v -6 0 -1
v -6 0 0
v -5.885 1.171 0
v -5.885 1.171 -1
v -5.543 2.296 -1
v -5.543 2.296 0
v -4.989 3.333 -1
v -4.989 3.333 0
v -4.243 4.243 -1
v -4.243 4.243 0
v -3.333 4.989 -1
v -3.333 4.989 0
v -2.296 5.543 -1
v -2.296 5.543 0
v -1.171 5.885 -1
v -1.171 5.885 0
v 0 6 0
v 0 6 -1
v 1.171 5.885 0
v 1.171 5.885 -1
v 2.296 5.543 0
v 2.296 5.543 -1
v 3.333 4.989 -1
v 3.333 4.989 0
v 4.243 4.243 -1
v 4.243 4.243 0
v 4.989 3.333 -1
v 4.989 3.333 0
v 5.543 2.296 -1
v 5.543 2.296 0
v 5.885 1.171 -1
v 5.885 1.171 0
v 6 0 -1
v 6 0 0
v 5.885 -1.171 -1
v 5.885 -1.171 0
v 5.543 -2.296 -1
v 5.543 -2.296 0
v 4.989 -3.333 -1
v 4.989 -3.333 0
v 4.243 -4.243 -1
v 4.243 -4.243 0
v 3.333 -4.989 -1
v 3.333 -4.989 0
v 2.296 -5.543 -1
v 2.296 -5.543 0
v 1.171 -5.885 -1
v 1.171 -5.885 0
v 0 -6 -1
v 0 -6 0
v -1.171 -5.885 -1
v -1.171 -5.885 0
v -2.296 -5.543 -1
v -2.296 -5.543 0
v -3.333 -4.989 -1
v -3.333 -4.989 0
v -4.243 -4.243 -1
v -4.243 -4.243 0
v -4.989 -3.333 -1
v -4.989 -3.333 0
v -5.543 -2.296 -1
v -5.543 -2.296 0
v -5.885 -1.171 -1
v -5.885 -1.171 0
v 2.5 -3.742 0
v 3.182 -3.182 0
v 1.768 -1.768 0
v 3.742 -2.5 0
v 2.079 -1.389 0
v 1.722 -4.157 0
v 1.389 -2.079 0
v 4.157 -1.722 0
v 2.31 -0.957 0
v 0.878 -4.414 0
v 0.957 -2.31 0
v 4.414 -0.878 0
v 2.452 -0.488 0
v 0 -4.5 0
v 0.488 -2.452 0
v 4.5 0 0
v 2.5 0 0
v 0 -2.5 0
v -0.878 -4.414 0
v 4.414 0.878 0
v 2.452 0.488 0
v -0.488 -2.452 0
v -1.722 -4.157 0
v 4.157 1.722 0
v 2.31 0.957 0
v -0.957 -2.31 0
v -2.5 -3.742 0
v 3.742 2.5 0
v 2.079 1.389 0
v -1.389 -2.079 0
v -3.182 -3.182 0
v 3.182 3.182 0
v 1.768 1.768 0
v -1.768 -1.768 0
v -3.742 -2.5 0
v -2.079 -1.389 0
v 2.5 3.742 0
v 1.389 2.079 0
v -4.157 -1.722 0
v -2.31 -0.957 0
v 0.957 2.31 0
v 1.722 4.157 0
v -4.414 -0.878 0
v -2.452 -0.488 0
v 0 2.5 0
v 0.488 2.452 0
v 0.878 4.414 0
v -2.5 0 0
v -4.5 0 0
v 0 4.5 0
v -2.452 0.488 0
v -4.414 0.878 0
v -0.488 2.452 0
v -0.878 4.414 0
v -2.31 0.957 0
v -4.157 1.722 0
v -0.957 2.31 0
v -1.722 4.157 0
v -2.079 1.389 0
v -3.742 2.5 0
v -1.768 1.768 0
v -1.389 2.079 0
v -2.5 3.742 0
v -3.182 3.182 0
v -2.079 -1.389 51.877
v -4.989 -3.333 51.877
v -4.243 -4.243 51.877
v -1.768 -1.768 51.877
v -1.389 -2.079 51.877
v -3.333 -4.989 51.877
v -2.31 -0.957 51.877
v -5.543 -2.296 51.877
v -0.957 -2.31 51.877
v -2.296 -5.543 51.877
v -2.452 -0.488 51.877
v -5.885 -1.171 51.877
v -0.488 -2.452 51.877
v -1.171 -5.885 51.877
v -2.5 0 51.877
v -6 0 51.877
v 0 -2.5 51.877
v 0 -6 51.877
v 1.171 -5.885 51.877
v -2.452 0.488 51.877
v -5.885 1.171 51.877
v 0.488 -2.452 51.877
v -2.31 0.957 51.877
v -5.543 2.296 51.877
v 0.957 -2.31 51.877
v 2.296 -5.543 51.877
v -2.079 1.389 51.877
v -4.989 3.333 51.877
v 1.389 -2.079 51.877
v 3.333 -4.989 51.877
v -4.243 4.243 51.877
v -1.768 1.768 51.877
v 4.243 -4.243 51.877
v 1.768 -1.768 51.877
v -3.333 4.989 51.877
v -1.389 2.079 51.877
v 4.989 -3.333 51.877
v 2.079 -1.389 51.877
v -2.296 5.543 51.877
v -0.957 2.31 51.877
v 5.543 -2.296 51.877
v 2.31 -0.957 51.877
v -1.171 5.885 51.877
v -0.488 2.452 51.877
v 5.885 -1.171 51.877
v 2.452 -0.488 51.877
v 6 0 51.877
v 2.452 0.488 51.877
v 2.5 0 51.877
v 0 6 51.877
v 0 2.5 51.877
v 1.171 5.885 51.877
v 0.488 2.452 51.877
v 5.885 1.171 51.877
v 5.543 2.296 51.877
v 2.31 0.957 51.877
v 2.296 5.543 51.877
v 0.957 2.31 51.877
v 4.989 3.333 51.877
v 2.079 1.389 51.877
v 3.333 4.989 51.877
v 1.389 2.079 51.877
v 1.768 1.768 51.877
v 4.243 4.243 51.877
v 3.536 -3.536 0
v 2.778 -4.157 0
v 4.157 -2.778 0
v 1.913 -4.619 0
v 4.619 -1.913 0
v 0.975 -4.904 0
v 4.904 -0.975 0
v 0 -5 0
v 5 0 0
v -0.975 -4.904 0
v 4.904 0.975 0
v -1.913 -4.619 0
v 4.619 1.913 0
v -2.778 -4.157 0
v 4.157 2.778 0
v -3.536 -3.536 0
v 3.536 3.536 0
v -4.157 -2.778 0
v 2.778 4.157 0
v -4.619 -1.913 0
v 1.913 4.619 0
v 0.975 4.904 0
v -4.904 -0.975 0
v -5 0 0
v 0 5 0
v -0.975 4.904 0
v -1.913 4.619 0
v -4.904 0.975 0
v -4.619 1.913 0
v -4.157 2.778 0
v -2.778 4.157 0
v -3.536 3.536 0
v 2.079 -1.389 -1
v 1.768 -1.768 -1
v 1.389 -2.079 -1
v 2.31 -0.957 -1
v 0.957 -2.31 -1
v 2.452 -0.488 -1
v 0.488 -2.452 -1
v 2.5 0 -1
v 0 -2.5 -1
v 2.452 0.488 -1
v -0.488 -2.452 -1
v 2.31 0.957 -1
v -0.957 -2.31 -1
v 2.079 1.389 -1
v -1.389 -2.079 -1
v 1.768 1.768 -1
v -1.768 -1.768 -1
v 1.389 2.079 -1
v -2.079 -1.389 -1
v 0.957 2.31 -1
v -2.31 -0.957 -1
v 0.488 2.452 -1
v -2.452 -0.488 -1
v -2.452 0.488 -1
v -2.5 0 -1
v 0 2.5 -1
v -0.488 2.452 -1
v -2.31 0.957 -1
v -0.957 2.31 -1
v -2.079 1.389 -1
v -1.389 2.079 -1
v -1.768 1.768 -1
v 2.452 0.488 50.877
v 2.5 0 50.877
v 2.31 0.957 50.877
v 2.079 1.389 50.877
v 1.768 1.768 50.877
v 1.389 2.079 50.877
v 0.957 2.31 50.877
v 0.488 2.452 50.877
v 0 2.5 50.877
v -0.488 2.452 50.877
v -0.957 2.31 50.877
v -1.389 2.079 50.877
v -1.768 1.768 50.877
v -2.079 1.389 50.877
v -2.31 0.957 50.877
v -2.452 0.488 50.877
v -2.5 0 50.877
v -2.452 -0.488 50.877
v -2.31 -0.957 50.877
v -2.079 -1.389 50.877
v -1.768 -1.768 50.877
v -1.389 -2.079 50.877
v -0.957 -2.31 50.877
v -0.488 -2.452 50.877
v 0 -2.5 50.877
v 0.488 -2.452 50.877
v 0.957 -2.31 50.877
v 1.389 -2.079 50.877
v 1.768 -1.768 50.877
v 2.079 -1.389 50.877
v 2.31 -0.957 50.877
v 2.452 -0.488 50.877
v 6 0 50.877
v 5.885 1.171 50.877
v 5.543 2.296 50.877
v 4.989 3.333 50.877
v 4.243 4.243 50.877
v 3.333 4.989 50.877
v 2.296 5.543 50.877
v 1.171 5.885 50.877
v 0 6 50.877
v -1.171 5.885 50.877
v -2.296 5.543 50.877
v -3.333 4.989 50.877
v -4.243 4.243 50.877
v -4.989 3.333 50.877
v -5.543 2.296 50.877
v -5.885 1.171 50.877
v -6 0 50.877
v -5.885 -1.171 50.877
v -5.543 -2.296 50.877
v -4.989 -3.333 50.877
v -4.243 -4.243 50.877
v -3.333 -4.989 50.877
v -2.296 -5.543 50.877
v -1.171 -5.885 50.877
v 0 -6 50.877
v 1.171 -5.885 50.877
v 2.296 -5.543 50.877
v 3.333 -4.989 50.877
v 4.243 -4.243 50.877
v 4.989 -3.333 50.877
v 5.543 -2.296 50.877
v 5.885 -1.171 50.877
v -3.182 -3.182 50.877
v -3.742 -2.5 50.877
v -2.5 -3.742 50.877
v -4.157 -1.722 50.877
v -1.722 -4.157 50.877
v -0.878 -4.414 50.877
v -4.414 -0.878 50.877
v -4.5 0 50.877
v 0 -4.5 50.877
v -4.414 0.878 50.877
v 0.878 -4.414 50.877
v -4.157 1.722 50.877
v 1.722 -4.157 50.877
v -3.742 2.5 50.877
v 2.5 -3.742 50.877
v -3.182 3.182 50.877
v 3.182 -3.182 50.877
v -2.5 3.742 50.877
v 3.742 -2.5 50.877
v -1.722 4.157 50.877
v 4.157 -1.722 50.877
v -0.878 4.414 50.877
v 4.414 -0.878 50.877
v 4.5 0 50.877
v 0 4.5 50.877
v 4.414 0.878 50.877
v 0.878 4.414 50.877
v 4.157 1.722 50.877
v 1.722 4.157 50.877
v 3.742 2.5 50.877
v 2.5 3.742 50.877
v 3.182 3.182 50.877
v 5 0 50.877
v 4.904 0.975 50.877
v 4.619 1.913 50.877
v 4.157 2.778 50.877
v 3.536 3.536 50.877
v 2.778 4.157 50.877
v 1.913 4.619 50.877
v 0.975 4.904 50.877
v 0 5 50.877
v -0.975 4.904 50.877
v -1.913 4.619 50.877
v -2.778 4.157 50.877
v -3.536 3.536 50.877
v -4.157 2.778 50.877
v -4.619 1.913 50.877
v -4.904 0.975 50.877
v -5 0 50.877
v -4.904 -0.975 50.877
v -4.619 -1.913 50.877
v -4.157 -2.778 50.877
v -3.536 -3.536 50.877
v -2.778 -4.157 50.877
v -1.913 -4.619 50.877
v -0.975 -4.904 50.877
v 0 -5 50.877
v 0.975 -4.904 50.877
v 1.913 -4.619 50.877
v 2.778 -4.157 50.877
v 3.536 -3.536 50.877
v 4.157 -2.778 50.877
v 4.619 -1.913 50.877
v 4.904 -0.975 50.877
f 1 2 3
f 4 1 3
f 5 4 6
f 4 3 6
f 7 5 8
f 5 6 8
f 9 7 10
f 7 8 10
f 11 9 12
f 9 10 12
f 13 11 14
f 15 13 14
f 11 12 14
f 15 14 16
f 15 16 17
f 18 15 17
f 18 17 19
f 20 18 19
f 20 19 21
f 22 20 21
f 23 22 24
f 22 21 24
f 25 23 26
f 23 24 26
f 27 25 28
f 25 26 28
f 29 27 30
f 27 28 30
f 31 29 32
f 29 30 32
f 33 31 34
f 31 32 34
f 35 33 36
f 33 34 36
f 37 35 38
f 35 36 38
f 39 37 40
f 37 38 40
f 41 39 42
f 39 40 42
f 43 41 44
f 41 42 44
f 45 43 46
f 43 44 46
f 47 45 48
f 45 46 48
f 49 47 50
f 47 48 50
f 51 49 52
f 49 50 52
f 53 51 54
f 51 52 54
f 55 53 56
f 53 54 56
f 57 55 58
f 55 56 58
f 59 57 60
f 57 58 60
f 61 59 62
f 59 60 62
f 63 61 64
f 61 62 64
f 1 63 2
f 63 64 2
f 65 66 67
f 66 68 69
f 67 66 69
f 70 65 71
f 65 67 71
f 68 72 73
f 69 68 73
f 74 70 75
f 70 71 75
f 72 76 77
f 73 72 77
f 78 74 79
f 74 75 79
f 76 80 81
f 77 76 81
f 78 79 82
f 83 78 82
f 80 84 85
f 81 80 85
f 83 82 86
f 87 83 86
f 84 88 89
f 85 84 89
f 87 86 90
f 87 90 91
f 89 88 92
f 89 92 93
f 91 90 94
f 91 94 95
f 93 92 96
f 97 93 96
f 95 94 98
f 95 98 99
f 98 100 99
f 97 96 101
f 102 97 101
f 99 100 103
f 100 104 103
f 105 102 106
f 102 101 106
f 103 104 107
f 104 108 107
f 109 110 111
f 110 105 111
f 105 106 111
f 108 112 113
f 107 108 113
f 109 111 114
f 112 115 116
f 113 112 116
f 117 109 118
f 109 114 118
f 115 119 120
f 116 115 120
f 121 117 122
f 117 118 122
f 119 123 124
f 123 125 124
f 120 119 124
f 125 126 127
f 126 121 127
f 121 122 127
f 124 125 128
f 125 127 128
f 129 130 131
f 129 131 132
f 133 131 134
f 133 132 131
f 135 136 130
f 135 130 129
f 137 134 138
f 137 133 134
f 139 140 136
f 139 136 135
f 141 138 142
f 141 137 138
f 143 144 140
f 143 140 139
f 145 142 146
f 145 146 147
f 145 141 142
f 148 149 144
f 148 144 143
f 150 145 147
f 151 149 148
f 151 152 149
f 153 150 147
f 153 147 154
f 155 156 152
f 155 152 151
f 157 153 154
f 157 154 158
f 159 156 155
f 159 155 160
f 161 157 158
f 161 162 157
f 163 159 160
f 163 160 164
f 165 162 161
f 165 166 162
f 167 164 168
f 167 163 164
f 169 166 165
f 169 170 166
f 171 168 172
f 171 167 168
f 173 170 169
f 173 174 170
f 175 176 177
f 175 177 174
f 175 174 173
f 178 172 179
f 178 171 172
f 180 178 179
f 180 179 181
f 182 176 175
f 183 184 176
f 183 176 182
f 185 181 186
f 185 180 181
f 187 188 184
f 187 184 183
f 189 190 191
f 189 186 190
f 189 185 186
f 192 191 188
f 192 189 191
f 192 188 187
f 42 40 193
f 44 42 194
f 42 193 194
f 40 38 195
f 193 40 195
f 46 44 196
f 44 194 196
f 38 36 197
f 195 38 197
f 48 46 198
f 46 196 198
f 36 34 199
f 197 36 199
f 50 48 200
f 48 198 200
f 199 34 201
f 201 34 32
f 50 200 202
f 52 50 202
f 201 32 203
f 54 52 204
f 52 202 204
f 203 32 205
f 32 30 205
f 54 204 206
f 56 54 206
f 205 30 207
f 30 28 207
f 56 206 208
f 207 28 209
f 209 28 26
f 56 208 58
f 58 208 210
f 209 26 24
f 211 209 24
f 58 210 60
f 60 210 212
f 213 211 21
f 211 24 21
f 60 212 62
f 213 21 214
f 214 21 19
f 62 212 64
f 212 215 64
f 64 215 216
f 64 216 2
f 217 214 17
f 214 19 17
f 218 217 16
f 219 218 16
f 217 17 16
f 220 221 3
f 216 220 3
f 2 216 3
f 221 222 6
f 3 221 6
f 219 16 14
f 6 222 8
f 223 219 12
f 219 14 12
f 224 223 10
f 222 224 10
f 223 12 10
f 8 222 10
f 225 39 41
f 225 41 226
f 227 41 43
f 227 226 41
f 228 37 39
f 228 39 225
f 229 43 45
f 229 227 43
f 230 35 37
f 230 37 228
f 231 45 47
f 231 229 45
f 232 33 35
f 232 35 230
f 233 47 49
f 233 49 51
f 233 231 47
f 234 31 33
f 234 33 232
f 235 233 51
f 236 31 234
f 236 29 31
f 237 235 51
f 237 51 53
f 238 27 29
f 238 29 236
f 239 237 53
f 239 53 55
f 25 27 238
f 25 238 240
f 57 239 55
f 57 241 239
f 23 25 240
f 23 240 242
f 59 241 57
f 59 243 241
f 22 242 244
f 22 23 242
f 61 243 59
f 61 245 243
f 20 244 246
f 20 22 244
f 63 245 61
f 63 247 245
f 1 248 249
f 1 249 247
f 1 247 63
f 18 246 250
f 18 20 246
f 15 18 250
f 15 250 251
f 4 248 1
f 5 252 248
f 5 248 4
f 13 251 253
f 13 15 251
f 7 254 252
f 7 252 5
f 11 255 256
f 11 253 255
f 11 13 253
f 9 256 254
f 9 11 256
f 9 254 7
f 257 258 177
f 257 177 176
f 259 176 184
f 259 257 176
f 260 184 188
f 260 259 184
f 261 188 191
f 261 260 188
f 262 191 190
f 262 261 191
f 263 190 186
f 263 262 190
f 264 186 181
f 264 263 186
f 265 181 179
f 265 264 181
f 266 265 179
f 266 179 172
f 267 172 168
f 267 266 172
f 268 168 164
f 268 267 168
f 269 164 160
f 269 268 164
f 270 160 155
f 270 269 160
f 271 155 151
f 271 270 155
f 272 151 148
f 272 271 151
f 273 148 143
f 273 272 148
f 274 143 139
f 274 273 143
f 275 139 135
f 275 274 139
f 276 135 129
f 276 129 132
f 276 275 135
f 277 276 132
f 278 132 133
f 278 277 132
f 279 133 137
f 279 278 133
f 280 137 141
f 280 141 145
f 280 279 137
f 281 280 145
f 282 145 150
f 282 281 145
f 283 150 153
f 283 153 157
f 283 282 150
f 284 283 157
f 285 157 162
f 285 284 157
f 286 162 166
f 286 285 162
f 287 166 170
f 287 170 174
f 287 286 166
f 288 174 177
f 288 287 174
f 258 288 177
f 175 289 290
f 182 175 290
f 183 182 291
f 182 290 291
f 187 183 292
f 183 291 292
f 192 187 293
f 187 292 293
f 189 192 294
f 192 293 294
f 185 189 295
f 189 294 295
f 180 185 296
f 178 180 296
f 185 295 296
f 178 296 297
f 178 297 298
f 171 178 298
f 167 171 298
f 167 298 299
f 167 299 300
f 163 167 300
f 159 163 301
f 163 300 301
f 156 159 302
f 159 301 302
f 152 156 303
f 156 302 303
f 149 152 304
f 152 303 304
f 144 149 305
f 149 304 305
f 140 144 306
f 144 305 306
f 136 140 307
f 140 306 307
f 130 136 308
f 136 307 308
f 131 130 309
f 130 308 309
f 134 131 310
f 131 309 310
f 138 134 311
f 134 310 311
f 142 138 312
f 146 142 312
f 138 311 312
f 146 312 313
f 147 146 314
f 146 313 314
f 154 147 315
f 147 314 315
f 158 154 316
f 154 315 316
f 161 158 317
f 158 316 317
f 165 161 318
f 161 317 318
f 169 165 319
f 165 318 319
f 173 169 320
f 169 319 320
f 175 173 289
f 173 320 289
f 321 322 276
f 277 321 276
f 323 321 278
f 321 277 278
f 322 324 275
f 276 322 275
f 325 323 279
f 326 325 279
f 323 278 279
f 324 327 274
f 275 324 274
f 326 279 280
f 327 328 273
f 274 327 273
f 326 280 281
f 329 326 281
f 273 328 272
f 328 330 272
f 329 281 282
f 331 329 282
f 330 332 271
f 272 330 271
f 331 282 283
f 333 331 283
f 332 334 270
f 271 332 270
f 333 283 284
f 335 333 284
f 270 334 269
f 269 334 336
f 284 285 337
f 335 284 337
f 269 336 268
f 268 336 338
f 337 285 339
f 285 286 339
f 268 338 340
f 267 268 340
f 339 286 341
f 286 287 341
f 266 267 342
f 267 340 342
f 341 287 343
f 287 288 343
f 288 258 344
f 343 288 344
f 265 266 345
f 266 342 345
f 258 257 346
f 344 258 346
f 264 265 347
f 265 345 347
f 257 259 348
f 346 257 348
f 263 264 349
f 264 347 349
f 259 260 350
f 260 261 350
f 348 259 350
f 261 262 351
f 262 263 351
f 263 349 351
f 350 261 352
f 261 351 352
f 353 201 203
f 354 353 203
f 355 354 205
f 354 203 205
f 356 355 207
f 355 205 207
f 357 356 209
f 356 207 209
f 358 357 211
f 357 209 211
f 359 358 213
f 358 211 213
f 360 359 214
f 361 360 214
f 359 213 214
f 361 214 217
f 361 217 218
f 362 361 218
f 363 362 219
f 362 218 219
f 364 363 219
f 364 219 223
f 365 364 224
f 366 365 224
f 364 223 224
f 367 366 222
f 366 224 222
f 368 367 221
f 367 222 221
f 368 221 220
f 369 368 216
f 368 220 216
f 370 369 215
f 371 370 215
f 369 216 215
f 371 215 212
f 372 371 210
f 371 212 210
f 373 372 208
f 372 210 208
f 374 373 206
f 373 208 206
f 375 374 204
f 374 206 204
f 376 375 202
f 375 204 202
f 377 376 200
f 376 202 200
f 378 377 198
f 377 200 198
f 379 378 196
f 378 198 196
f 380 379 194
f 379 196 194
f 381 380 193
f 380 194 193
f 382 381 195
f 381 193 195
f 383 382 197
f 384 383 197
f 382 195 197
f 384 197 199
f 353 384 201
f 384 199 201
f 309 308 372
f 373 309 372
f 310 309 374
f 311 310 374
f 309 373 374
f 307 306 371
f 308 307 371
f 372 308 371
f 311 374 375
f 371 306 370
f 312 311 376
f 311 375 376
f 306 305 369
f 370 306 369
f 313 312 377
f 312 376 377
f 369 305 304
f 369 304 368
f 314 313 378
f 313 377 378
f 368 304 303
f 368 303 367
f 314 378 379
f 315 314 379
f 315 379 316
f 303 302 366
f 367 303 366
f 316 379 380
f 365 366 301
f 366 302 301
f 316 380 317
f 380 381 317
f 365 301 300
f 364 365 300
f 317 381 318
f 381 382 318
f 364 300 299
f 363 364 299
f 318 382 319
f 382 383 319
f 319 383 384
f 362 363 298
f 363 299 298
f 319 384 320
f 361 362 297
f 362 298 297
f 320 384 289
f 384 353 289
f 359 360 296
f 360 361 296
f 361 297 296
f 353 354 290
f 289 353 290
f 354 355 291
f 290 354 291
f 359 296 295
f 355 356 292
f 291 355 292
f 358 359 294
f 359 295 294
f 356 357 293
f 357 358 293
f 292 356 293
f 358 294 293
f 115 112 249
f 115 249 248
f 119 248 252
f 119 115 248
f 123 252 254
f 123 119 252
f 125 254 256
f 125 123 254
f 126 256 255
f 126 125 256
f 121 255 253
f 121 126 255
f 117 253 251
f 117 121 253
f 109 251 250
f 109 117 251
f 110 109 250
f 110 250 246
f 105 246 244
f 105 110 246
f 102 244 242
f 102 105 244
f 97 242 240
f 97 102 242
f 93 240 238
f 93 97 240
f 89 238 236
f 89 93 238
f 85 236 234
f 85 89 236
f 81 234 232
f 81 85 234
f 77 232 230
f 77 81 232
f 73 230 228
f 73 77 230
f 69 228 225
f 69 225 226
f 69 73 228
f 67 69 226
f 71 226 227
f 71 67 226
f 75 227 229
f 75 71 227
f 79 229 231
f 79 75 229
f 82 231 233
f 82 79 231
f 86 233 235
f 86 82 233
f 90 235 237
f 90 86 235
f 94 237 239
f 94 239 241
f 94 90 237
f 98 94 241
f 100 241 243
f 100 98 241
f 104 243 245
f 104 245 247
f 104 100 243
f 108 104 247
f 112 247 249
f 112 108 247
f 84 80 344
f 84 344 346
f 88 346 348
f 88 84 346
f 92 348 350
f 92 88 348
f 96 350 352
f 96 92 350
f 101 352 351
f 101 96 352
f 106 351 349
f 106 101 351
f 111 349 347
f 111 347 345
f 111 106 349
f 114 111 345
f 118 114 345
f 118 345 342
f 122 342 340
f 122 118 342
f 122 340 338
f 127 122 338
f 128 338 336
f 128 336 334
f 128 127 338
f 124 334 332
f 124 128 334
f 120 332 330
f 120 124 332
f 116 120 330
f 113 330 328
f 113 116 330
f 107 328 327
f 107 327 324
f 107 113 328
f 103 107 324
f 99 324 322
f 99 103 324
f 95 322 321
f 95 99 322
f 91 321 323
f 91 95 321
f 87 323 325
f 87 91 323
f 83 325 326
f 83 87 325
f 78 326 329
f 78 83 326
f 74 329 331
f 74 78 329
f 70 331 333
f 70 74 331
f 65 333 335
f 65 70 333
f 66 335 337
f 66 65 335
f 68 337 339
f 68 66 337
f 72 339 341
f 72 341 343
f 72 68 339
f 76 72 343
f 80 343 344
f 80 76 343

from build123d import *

# Parameters (mm, degrees)
SKETCH1_R           = 5
SKETCH1_R_2         = 4.5
BOSS_EXTRUDE1_DEPTH = 50.87650029
SKETCH2_R           = 6
SKETCH2_R_2         = 2.5
BOSS_EXTRUDE2_DEPTH = 1
SKETCH3_R           = 6
SKETCH3_R_2         = 2.5
BOSS_EXTRUDE3_DEPTH = 1


with BuildPart() as part:
    # Sketch1 → Boss-Extrude1 (new body)
    with BuildSketch(Plane.XY):
        Circle(SKETCH1_R)
        Circle(SKETCH1_R_2, mode=Mode.SUBTRACT)
    extrude(amount=BOSS_EXTRUDE1_DEPTH)

    # Sketch2 → Boss-Extrude2 (add)
    with BuildSketch(Plane(origin=(0, 0, 0), x_dir=(-1, 0, 0), z_dir=(0, 0, -1))):
        Circle(SKETCH2_R)
        Circle(SKETCH2_R_2, mode=Mode.SUBTRACT)
    extrude(amount=BOSS_EXTRUDE2_DEPTH)

    # Sketch3 → Boss-Extrude3 (add)
    with BuildSketch(Plane.XY.offset(50.87650029)):
        Circle(SKETCH3_R)
        Circle(SKETCH3_R_2, mode=Mode.SUBTRACT)
    extrude(amount=BOSS_EXTRUDE3_DEPTH)


solid = part.part
